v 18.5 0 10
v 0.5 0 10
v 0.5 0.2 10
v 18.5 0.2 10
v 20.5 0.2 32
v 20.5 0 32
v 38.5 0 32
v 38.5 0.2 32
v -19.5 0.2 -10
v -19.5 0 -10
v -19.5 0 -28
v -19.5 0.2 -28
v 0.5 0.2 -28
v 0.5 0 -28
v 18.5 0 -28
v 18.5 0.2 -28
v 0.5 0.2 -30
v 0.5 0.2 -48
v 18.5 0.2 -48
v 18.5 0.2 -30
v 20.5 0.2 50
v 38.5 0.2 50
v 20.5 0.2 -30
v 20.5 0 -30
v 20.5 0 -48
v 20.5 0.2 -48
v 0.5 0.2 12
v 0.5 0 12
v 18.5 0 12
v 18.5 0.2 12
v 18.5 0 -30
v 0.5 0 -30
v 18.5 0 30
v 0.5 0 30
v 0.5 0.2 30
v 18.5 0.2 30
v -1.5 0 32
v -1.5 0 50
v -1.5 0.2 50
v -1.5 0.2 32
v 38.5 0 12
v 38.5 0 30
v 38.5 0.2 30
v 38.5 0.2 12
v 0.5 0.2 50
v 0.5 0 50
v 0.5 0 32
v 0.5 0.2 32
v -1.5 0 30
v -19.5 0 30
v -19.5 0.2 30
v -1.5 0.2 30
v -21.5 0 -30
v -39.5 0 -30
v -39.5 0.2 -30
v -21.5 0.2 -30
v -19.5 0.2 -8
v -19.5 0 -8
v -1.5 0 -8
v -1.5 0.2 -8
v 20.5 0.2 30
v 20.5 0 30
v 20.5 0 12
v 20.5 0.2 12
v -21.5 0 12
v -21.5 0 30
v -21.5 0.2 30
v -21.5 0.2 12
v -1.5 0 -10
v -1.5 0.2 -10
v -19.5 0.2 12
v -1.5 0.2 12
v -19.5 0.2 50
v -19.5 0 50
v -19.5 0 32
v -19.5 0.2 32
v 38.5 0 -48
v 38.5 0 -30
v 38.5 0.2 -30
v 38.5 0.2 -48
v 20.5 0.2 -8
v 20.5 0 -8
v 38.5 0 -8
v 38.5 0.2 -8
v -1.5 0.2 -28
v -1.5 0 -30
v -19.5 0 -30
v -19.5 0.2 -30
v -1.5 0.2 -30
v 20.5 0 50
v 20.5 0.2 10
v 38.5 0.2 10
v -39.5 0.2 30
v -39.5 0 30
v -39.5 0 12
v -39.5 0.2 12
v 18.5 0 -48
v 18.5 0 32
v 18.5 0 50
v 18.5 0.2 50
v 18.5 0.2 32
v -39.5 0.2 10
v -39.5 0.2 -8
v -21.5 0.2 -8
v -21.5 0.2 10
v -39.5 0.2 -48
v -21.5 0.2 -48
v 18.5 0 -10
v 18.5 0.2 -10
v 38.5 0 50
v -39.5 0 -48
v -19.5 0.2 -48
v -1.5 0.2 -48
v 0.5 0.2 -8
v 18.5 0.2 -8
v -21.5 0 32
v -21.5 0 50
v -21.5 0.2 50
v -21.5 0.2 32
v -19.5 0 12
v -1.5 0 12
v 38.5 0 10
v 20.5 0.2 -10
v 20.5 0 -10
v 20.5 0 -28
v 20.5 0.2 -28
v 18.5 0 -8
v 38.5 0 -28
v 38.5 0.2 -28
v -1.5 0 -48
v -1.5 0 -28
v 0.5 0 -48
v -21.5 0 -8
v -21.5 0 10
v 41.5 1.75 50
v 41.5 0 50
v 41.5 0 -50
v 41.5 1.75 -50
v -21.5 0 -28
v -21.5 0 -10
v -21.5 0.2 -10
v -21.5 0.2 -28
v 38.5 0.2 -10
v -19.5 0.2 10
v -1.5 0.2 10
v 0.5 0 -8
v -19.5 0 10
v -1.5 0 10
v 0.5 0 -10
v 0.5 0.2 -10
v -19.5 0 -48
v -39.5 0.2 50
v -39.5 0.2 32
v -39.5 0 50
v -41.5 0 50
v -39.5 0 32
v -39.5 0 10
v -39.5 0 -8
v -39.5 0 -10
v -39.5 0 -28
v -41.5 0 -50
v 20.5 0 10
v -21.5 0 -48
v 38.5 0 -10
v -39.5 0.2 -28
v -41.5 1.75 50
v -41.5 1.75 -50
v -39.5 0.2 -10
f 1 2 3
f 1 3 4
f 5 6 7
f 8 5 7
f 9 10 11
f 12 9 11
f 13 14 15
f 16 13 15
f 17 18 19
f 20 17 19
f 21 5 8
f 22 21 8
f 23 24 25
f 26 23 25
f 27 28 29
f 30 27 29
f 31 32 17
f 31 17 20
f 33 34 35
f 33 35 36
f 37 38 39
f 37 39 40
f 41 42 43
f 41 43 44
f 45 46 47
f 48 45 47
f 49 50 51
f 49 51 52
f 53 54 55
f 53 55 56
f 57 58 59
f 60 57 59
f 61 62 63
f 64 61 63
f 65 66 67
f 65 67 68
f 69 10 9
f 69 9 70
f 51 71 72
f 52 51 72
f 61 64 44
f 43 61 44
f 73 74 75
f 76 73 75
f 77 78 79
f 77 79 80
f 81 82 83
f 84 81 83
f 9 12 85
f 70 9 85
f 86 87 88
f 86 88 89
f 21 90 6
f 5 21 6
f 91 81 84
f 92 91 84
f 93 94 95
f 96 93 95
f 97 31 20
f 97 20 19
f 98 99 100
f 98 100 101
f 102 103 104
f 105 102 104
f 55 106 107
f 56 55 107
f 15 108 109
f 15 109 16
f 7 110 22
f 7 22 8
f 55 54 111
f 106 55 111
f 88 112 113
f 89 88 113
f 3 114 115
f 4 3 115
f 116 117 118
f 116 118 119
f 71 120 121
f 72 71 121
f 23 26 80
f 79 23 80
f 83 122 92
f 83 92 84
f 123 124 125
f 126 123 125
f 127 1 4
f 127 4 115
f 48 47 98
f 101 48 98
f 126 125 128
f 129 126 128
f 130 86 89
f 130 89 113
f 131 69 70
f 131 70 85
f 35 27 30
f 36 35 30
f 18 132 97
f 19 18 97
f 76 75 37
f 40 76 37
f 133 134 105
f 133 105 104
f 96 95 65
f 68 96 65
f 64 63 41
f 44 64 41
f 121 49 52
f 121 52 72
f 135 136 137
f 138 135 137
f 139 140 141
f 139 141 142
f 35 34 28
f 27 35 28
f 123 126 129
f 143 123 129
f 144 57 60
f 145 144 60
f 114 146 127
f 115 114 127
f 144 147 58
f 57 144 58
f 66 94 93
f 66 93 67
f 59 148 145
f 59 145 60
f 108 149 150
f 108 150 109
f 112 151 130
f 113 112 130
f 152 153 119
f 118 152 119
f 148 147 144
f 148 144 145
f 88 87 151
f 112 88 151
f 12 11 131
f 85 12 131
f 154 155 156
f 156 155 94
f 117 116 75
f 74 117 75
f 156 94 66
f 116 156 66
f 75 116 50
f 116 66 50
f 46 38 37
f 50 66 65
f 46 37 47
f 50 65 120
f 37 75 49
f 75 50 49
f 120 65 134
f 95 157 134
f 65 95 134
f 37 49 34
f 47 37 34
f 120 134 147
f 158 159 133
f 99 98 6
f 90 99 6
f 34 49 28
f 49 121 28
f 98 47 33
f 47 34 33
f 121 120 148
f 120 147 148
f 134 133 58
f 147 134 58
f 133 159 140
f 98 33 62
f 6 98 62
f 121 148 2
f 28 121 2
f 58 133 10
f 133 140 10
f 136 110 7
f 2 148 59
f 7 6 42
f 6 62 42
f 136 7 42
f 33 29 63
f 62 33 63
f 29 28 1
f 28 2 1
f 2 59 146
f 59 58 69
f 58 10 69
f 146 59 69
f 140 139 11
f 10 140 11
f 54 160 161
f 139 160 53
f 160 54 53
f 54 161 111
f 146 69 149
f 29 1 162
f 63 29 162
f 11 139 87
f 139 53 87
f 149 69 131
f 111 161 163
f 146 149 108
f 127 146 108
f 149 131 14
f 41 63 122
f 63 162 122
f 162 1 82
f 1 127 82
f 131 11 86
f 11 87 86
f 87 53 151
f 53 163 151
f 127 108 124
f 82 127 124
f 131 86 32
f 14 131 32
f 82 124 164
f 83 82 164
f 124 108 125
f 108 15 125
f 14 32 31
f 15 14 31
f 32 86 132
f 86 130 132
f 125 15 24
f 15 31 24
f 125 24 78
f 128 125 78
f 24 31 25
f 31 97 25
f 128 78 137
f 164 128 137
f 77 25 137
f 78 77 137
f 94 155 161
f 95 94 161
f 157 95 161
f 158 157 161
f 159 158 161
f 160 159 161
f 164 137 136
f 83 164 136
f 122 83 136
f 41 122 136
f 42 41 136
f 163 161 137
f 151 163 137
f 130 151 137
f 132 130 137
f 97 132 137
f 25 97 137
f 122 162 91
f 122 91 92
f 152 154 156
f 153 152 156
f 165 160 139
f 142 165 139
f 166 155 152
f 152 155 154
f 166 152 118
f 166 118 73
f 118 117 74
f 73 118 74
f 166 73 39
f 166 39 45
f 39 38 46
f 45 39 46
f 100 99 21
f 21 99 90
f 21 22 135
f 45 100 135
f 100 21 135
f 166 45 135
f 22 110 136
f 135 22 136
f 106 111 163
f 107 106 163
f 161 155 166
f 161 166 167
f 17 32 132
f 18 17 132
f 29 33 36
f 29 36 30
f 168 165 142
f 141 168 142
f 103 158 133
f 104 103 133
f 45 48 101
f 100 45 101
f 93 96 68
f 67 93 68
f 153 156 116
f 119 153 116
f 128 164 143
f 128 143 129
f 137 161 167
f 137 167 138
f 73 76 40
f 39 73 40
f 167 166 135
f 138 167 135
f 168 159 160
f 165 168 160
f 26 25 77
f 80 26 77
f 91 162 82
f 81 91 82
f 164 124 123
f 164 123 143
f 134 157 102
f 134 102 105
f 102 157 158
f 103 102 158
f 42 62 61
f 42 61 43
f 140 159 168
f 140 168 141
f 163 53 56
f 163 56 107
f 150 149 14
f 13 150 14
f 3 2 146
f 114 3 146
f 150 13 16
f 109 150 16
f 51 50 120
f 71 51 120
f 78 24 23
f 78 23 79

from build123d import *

# Parameters (mm, degrees)
SKETCH2_W            = 83
SKETCH2_H            = 100
BOSS_EXTRUDE1_DEPTH  = 1.75
SKETCH3_W            = 18
SKETCH3_H            = 18
CUT_EXTRUDE5_DEPTH   = 0.2
LPATTERN1_COUNT      = 4
LPATTERN1_PITCH      = 20
LPATTERN1_COUNT_DIR2 = 5
LPATTERN1_PITCH_DIR2 = 20


with BuildPart() as part:
    # Sketch2 → Boss-Extrude1 (new body)
    with BuildSketch(Plane(origin=(0, 0, 0), x_dir=(1, 0, 0), z_dir=(0, 1, 0))):
        Rectangle(SKETCH2_W, SKETCH2_H)
    extrude(amount=BOSS_EXTRUDE1_DEPTH)

    # Sketch3 → Cut-Extrude5 (cut)
    with BuildSketch(Plane(origin=(0, 0, 0), x_dir=(1, 0, 0), z_dir=(0, 1, 0))):
        with Locations((-30.5, 39)):
            Rectangle(SKETCH3_W, SKETCH3_H)
    cut_extrude5 = extrude(amount=CUT_EXTRUDE5_DEPTH, mode=Mode.SUBTRACT)

    # LPattern1: Cut-Extrude5 4 × 5
    with Locations(*[(i * LPATTERN1_PITCH, 0, j * LPATTERN1_PITCH_DIR2) for i in range(LPATTERN1_COUNT) for j in range(LPATTERN1_COUNT_DIR2) if (i, j) != (0, 0)]):
        add(cut_extrude5, mode=Mode.SUBTRACT)


solid = part.part
